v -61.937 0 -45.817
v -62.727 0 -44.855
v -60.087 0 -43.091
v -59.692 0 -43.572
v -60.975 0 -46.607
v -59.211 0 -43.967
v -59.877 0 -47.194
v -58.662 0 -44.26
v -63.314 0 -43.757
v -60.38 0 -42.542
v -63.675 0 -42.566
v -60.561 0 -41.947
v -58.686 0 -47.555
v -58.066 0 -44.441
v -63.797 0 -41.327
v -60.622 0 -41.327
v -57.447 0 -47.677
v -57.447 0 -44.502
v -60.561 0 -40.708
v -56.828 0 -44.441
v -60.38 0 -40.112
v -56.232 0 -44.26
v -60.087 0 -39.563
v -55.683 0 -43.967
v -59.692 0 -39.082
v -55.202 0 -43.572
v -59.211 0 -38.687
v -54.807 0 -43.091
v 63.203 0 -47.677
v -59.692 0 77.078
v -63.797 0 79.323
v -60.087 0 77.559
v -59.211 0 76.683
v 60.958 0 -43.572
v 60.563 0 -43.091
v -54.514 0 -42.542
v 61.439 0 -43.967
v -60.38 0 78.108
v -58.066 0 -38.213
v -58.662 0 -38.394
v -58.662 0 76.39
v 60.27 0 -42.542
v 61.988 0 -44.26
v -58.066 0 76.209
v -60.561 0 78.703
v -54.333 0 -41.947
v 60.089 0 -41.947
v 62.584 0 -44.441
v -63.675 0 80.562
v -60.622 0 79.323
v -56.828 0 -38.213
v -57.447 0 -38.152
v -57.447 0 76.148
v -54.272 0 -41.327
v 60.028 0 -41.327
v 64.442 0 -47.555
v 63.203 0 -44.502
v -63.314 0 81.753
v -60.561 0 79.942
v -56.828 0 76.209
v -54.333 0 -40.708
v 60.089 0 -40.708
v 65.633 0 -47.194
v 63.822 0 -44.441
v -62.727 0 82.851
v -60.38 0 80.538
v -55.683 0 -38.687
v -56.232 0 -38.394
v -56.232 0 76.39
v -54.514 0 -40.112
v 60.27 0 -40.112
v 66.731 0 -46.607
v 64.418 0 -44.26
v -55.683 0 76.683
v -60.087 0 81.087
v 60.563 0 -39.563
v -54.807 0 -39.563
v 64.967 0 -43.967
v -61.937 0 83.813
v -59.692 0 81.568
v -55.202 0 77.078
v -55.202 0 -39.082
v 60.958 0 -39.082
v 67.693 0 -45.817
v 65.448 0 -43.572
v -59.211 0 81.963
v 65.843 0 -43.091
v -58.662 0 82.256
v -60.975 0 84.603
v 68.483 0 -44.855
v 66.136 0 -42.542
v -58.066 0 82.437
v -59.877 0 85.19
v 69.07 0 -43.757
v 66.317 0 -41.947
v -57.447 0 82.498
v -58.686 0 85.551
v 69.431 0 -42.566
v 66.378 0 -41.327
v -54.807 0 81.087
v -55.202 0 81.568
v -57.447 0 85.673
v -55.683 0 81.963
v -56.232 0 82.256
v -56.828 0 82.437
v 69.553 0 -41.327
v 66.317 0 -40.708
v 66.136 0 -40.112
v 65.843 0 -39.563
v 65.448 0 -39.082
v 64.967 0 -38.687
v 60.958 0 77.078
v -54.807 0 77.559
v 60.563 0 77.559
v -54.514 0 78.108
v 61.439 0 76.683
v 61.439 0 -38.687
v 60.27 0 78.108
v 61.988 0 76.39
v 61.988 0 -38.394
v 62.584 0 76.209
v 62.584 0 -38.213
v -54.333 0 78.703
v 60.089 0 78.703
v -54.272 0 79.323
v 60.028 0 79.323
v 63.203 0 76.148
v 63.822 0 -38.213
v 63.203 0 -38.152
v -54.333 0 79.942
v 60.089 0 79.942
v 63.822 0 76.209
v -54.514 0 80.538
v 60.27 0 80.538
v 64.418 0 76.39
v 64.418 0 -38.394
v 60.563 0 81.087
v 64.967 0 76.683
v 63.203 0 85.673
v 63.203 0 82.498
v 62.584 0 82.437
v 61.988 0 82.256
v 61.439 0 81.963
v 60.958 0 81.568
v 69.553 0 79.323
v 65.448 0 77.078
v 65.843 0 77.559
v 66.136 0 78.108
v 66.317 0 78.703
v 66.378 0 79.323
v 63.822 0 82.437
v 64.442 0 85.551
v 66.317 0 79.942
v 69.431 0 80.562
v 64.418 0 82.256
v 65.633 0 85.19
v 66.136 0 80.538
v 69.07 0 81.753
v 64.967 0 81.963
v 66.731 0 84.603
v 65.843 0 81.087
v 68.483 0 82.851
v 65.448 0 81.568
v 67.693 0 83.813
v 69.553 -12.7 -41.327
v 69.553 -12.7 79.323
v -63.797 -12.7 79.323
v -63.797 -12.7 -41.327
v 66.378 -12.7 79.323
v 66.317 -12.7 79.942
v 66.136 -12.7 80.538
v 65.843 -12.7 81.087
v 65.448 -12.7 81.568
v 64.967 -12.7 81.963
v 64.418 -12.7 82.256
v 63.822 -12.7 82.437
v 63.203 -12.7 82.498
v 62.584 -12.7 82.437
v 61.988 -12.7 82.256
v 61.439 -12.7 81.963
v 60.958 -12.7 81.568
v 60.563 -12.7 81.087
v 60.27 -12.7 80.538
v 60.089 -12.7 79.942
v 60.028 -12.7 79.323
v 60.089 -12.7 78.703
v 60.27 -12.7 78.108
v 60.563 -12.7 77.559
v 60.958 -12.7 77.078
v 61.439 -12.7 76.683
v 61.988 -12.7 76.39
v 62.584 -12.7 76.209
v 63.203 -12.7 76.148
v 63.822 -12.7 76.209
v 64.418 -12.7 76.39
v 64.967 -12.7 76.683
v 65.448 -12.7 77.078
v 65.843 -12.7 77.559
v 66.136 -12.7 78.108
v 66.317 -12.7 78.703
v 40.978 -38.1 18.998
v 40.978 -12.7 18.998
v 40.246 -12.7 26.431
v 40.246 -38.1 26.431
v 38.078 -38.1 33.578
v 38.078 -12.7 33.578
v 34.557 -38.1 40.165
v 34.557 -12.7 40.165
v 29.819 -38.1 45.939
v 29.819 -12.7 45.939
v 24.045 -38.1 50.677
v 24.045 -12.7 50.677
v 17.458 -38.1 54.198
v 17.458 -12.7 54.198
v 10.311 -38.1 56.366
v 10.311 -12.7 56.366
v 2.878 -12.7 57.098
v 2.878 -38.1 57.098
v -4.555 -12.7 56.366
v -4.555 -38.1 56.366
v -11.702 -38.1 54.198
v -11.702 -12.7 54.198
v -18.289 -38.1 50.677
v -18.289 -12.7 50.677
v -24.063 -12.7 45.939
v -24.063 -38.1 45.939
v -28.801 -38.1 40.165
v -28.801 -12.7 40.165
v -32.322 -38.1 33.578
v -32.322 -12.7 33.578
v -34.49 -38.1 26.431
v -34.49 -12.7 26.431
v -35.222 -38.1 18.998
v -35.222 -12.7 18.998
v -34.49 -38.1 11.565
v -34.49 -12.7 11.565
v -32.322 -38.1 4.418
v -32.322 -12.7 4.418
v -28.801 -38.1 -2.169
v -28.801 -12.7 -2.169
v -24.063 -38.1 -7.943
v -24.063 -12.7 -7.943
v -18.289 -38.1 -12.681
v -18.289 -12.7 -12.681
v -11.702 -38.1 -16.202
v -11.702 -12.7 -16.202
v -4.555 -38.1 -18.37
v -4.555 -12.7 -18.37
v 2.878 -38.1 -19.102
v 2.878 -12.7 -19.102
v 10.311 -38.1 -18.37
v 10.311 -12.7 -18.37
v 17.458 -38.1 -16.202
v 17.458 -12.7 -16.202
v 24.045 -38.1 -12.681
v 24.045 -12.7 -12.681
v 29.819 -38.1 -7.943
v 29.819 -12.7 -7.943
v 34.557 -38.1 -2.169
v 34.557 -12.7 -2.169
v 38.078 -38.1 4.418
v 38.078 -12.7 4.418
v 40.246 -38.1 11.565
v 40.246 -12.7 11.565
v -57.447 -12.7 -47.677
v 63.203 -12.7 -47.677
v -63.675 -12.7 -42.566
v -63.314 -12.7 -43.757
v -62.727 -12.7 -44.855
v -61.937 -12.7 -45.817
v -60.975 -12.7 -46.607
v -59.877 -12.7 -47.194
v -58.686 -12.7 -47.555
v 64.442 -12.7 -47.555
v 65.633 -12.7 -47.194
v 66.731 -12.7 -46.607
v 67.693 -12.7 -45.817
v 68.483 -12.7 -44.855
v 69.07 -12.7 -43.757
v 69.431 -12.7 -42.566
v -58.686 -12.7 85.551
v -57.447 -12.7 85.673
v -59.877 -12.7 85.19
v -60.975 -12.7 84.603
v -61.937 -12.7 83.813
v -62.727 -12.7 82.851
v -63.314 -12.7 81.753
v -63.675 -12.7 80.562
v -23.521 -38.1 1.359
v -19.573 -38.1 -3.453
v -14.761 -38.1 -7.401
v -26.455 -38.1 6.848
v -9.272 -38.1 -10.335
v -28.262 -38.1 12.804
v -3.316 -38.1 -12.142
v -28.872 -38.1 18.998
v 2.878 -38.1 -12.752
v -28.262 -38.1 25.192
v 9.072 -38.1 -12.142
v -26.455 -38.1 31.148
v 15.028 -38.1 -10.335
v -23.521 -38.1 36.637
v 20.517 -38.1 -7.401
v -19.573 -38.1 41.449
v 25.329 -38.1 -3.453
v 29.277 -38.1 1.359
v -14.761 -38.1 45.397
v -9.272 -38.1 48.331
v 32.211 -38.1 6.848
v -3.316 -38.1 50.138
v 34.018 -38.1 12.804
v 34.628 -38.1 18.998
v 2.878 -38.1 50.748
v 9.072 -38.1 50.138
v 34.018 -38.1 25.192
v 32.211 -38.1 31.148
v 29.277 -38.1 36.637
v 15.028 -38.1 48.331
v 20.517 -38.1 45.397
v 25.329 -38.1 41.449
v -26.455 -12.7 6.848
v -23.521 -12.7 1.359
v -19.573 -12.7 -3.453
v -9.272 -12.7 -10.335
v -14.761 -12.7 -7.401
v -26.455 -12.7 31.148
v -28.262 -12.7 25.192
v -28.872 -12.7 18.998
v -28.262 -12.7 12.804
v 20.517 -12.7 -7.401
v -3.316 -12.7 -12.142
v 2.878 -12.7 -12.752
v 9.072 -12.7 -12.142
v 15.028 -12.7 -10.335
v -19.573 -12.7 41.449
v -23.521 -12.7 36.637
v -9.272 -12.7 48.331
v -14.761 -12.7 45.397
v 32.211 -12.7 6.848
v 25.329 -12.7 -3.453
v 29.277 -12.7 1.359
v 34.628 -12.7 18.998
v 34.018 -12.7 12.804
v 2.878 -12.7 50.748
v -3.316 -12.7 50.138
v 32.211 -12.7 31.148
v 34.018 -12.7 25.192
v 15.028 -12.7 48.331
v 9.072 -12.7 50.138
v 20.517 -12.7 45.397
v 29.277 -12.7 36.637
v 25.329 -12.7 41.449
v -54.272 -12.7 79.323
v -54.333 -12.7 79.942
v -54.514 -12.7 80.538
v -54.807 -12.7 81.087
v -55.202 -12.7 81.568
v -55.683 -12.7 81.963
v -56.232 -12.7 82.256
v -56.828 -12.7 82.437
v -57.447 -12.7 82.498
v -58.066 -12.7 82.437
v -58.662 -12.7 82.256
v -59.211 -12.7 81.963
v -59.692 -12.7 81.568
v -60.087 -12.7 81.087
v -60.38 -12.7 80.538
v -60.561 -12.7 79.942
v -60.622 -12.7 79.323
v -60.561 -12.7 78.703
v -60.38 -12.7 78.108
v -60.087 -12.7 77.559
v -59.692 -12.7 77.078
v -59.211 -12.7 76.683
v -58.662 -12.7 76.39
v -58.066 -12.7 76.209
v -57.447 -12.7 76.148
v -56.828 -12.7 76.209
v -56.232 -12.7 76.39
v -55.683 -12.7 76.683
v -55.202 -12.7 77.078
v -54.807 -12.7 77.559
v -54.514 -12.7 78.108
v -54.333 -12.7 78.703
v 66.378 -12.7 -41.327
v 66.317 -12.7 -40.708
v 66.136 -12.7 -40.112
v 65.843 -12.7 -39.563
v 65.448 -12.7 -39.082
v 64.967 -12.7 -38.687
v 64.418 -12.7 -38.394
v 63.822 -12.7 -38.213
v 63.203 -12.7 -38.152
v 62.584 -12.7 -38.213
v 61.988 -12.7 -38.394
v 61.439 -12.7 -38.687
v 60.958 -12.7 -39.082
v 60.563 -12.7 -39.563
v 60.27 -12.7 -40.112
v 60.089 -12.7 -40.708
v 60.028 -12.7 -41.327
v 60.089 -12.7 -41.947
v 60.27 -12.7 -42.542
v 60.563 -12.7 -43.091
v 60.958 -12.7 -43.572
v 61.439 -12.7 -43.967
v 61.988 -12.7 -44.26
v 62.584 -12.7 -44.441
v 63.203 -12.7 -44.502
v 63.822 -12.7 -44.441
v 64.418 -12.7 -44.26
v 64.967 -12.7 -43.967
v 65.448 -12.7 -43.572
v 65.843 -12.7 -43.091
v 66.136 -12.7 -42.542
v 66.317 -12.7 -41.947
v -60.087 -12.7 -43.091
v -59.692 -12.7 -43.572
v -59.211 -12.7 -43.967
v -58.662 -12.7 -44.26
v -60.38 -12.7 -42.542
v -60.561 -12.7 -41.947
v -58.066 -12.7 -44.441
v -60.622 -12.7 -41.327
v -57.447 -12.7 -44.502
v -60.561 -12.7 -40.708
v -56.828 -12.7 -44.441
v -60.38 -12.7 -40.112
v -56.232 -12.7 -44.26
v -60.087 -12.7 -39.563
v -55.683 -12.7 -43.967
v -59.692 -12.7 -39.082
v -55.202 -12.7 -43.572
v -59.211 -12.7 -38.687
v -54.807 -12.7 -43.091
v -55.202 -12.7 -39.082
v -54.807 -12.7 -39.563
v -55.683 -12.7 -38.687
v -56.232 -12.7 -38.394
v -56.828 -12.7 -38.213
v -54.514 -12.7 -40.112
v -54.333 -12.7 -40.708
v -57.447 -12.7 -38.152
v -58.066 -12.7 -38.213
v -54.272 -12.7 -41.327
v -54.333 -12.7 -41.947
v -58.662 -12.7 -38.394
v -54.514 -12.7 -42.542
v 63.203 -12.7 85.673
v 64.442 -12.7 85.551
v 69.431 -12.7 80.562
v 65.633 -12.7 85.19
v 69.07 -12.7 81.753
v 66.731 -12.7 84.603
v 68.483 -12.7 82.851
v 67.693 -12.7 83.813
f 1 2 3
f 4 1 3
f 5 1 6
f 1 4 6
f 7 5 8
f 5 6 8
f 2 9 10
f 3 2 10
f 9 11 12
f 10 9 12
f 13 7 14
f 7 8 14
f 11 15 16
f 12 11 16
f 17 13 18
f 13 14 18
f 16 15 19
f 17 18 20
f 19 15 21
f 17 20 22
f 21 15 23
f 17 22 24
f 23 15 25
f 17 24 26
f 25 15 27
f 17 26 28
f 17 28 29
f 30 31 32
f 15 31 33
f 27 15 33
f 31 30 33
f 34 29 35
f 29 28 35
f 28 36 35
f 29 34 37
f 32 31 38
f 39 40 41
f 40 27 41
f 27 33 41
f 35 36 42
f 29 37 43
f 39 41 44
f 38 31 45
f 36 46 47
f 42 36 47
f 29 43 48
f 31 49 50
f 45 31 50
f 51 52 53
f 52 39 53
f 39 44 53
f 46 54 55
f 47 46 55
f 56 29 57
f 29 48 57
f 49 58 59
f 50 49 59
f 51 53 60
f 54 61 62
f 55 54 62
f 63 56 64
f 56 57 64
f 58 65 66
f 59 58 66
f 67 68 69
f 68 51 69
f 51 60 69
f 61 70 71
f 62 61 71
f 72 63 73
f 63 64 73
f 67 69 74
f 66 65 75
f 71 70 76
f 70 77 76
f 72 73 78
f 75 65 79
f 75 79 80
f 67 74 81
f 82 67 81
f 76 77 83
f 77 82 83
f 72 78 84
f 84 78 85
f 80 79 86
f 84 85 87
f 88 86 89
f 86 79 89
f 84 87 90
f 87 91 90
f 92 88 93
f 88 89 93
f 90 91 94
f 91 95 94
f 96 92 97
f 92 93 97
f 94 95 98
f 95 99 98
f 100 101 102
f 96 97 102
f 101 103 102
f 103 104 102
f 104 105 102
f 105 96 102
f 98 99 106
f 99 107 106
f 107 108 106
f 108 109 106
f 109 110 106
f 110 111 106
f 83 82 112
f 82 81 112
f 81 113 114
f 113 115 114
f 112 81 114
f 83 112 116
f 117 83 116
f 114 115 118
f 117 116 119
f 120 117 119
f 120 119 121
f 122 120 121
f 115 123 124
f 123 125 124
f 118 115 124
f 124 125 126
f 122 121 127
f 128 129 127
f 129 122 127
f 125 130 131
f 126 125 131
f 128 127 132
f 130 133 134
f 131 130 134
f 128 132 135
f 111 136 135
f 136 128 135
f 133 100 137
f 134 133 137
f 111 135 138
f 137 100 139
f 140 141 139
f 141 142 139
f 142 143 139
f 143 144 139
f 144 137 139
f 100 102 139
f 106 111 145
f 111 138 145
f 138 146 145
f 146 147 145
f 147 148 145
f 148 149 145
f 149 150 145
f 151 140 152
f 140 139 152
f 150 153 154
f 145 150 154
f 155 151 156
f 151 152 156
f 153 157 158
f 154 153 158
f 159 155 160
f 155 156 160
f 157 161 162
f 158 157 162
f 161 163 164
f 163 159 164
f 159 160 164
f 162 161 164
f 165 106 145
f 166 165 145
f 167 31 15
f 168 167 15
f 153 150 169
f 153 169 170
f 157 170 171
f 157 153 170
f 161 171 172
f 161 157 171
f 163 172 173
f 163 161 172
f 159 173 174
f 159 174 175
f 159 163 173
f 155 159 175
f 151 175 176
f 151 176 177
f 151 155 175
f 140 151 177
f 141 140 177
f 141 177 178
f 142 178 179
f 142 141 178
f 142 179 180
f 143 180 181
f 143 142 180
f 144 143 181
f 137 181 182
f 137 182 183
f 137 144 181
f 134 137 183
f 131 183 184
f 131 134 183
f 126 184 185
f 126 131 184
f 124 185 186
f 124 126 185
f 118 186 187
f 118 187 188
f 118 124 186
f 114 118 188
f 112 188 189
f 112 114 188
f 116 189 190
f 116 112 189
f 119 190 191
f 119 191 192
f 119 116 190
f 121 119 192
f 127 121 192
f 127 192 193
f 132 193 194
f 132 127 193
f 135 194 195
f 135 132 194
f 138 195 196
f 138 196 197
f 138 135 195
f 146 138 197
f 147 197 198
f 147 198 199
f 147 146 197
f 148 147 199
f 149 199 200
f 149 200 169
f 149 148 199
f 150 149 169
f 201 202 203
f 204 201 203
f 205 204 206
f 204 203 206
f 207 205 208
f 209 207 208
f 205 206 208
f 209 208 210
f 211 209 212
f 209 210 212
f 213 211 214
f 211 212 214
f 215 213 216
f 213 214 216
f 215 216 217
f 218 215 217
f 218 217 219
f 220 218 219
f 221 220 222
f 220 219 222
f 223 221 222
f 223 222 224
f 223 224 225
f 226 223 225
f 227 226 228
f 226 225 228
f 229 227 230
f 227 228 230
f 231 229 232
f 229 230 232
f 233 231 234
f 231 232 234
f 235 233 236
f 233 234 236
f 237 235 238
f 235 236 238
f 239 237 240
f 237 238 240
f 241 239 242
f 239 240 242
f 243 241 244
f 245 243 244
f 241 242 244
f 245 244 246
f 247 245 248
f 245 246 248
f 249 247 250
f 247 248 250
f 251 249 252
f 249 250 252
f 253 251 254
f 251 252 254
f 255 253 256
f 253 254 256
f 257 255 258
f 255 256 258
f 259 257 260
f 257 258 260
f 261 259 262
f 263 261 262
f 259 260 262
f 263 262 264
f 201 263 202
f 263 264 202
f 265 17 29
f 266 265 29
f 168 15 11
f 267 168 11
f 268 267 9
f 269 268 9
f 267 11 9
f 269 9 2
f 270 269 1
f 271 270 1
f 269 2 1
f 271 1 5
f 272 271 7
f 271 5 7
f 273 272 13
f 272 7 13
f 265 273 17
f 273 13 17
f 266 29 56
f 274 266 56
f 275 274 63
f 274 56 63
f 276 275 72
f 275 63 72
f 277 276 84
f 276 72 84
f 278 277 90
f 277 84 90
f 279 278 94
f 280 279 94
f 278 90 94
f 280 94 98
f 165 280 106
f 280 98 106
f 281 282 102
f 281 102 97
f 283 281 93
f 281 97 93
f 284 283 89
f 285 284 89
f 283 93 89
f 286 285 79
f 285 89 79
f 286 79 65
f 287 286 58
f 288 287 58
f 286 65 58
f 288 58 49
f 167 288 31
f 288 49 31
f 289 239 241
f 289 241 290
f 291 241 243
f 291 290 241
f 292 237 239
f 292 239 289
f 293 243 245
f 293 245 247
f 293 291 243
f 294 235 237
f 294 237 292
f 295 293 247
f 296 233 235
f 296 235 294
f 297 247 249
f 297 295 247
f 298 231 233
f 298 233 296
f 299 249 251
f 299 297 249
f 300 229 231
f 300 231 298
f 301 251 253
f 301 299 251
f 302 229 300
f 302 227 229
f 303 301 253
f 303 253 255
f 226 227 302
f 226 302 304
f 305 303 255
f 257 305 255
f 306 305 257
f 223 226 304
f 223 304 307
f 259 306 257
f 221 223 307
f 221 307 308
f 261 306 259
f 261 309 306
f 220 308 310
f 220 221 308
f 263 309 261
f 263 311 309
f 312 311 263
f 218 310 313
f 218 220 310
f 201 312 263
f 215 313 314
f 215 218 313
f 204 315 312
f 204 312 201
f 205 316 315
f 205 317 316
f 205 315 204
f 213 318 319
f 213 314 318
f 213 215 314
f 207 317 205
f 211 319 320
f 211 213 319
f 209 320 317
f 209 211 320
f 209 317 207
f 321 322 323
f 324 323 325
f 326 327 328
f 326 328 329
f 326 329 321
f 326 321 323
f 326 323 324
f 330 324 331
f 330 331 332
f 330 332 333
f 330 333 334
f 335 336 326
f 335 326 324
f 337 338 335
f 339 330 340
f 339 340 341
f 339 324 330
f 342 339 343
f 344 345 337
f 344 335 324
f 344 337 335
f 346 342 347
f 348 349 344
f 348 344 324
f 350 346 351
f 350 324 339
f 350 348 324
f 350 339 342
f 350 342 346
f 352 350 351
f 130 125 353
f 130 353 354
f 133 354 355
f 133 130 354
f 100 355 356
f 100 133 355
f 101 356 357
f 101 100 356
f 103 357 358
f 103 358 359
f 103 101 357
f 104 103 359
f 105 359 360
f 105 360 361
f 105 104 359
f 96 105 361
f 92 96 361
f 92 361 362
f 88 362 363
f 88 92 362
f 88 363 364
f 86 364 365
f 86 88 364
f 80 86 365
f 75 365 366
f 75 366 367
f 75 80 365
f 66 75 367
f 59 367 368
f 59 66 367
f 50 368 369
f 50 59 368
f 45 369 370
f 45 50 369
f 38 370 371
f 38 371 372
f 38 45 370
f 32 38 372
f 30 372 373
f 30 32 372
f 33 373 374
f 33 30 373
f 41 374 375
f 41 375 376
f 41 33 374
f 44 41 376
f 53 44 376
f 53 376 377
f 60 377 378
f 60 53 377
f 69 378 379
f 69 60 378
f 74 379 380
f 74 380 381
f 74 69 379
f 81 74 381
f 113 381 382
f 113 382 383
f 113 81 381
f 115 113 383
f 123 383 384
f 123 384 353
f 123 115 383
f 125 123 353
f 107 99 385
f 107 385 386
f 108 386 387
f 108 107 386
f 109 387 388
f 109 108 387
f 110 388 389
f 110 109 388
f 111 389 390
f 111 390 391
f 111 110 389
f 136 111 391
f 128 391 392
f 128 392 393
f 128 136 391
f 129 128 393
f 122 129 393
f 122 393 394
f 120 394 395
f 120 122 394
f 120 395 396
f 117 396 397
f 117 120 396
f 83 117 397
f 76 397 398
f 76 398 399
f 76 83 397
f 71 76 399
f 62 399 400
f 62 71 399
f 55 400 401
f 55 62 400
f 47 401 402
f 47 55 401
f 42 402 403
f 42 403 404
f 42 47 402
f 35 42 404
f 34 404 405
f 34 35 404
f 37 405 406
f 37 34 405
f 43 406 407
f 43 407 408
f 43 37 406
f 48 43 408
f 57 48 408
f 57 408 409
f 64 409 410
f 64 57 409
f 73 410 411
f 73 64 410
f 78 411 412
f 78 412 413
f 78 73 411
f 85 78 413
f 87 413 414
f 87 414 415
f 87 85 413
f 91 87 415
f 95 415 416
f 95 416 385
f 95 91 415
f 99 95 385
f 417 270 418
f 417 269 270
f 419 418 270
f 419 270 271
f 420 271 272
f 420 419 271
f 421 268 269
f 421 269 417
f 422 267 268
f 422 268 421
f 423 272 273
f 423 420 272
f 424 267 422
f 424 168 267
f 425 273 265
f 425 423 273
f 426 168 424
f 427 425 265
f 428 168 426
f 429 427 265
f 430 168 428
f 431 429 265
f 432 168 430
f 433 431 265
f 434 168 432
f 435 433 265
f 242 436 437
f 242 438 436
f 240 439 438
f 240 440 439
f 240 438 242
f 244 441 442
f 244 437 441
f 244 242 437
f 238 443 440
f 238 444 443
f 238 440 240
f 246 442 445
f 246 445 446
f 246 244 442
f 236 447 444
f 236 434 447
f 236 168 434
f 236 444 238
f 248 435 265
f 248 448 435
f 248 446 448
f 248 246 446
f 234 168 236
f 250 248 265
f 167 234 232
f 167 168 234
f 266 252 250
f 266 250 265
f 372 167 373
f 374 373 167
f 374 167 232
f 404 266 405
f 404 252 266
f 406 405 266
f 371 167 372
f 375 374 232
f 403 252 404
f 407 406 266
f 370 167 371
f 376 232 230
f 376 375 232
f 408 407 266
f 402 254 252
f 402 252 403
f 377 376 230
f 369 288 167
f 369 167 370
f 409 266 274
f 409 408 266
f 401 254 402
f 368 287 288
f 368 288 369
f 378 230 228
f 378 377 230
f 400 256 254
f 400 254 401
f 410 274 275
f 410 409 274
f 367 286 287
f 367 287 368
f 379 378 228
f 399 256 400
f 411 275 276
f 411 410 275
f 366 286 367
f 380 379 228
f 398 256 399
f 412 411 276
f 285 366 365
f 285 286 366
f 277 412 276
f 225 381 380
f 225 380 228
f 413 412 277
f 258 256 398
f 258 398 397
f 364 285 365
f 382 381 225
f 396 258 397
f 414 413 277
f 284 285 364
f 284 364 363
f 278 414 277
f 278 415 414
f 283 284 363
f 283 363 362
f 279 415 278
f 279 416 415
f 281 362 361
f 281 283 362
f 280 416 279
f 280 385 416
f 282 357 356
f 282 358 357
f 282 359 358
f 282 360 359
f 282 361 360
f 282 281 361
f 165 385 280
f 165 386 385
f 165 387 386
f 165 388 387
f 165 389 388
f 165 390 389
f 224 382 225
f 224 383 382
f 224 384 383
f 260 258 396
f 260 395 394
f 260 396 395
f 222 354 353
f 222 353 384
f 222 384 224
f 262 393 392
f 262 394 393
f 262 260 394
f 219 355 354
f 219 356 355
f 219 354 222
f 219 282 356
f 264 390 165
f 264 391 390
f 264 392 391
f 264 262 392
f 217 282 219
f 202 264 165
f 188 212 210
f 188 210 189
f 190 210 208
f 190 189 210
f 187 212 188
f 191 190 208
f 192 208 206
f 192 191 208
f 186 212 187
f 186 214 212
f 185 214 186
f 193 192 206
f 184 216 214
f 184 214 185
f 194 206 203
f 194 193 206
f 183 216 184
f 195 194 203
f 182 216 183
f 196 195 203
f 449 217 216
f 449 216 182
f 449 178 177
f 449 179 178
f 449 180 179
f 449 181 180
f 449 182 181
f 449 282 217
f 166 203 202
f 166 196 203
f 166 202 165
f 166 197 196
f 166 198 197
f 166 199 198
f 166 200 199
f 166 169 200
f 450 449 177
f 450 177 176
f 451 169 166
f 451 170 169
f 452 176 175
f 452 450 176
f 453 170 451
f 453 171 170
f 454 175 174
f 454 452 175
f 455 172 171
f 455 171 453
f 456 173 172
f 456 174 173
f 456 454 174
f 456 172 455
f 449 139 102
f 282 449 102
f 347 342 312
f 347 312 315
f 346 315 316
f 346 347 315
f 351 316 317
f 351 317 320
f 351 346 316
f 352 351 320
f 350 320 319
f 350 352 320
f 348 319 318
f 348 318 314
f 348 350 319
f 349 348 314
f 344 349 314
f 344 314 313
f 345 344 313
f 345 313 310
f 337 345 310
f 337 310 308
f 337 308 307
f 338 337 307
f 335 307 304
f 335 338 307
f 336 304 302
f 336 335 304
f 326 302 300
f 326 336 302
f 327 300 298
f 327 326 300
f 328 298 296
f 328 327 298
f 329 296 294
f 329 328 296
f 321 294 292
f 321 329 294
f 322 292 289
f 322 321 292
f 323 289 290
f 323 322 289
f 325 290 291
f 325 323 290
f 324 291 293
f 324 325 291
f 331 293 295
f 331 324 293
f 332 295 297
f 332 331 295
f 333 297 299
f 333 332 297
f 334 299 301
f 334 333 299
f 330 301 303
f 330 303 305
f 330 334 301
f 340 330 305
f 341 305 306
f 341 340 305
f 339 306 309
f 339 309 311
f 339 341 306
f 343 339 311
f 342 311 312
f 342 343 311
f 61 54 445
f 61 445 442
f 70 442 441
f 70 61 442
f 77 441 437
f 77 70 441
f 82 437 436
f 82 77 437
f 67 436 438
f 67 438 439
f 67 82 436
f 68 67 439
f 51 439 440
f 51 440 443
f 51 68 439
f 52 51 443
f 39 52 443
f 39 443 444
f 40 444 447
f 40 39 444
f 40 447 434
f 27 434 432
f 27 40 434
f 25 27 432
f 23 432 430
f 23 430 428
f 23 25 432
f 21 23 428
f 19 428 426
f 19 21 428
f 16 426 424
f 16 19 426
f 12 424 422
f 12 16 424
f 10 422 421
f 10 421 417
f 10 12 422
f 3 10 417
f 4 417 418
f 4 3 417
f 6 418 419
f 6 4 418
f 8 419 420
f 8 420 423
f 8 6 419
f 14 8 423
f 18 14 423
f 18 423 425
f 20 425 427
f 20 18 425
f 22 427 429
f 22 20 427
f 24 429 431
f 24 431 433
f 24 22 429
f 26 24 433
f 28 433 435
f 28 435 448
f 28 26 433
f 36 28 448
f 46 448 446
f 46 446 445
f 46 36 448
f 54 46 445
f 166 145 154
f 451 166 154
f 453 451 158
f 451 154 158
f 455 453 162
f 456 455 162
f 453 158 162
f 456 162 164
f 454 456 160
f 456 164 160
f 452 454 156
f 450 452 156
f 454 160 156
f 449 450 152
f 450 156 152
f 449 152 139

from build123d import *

# Parameters (mm, degrees)
F0_R     = 3.175
F1_DEPTH = 12.7
F2_R     = 38.1
F2_R_2   = 31.75
F3_DEPTH = 25.4


with BuildPart() as f1:
    # F0 (on Front) → F1 (new body)
    with BuildSketch(Plane.XZ):
        with BuildLine():
            Line((63.203057, 85.672887), (-57.446943, 85.672887))
            ThreePointArc((-57.446943, 85.672887), (-61.937071, 83.813015), (-63.796943, 79.322887))
            Line((-63.796943, 79.322887), (-63.796943, -41.327113))
            ThreePointArc((-63.796943, -41.327113), (-61.937071, -45.817241), (-57.446943, -47.677113))
            Line((-57.446943, -47.677113), (63.203057, -47.677113))
            ThreePointArc((63.203057, -47.677113), (67.693185, -45.817241), (69.553057, -41.327113))
            Line((69.553057, -41.327113), (69.553057, 79.322887))
            ThreePointArc((69.553057, 79.322887), (67.693185, 83.813015), (63.203057, 85.672887))
        make_face()
        with Locations((-57.446943, -41.327113)):
            Circle(F0_R, mode=Mode.SUBTRACT)
        with Locations((63.203057, -41.327113)):
            Circle(F0_R, mode=Mode.SUBTRACT)
        with Locations((-57.446943, 79.322887)):
            Circle(F0_R, mode=Mode.SUBTRACT)
        with Locations((63.203057, 79.322887)):
            Circle(F0_R, mode=Mode.SUBTRACT)
    extrude(amount=F1_DEPTH)

    # F2 (on face) → F3 (join)
    with BuildSketch(Plane.XZ.offset(12.7)):
        with Locations((2.878057, 18.997887)):
            Circle(F2_R)
        with Locations((2.878057, 18.997887)):
            Circle(F2_R_2, mode=Mode.SUBTRACT)
    extrude(amount=F3_DEPTH)


solid = f1.part
